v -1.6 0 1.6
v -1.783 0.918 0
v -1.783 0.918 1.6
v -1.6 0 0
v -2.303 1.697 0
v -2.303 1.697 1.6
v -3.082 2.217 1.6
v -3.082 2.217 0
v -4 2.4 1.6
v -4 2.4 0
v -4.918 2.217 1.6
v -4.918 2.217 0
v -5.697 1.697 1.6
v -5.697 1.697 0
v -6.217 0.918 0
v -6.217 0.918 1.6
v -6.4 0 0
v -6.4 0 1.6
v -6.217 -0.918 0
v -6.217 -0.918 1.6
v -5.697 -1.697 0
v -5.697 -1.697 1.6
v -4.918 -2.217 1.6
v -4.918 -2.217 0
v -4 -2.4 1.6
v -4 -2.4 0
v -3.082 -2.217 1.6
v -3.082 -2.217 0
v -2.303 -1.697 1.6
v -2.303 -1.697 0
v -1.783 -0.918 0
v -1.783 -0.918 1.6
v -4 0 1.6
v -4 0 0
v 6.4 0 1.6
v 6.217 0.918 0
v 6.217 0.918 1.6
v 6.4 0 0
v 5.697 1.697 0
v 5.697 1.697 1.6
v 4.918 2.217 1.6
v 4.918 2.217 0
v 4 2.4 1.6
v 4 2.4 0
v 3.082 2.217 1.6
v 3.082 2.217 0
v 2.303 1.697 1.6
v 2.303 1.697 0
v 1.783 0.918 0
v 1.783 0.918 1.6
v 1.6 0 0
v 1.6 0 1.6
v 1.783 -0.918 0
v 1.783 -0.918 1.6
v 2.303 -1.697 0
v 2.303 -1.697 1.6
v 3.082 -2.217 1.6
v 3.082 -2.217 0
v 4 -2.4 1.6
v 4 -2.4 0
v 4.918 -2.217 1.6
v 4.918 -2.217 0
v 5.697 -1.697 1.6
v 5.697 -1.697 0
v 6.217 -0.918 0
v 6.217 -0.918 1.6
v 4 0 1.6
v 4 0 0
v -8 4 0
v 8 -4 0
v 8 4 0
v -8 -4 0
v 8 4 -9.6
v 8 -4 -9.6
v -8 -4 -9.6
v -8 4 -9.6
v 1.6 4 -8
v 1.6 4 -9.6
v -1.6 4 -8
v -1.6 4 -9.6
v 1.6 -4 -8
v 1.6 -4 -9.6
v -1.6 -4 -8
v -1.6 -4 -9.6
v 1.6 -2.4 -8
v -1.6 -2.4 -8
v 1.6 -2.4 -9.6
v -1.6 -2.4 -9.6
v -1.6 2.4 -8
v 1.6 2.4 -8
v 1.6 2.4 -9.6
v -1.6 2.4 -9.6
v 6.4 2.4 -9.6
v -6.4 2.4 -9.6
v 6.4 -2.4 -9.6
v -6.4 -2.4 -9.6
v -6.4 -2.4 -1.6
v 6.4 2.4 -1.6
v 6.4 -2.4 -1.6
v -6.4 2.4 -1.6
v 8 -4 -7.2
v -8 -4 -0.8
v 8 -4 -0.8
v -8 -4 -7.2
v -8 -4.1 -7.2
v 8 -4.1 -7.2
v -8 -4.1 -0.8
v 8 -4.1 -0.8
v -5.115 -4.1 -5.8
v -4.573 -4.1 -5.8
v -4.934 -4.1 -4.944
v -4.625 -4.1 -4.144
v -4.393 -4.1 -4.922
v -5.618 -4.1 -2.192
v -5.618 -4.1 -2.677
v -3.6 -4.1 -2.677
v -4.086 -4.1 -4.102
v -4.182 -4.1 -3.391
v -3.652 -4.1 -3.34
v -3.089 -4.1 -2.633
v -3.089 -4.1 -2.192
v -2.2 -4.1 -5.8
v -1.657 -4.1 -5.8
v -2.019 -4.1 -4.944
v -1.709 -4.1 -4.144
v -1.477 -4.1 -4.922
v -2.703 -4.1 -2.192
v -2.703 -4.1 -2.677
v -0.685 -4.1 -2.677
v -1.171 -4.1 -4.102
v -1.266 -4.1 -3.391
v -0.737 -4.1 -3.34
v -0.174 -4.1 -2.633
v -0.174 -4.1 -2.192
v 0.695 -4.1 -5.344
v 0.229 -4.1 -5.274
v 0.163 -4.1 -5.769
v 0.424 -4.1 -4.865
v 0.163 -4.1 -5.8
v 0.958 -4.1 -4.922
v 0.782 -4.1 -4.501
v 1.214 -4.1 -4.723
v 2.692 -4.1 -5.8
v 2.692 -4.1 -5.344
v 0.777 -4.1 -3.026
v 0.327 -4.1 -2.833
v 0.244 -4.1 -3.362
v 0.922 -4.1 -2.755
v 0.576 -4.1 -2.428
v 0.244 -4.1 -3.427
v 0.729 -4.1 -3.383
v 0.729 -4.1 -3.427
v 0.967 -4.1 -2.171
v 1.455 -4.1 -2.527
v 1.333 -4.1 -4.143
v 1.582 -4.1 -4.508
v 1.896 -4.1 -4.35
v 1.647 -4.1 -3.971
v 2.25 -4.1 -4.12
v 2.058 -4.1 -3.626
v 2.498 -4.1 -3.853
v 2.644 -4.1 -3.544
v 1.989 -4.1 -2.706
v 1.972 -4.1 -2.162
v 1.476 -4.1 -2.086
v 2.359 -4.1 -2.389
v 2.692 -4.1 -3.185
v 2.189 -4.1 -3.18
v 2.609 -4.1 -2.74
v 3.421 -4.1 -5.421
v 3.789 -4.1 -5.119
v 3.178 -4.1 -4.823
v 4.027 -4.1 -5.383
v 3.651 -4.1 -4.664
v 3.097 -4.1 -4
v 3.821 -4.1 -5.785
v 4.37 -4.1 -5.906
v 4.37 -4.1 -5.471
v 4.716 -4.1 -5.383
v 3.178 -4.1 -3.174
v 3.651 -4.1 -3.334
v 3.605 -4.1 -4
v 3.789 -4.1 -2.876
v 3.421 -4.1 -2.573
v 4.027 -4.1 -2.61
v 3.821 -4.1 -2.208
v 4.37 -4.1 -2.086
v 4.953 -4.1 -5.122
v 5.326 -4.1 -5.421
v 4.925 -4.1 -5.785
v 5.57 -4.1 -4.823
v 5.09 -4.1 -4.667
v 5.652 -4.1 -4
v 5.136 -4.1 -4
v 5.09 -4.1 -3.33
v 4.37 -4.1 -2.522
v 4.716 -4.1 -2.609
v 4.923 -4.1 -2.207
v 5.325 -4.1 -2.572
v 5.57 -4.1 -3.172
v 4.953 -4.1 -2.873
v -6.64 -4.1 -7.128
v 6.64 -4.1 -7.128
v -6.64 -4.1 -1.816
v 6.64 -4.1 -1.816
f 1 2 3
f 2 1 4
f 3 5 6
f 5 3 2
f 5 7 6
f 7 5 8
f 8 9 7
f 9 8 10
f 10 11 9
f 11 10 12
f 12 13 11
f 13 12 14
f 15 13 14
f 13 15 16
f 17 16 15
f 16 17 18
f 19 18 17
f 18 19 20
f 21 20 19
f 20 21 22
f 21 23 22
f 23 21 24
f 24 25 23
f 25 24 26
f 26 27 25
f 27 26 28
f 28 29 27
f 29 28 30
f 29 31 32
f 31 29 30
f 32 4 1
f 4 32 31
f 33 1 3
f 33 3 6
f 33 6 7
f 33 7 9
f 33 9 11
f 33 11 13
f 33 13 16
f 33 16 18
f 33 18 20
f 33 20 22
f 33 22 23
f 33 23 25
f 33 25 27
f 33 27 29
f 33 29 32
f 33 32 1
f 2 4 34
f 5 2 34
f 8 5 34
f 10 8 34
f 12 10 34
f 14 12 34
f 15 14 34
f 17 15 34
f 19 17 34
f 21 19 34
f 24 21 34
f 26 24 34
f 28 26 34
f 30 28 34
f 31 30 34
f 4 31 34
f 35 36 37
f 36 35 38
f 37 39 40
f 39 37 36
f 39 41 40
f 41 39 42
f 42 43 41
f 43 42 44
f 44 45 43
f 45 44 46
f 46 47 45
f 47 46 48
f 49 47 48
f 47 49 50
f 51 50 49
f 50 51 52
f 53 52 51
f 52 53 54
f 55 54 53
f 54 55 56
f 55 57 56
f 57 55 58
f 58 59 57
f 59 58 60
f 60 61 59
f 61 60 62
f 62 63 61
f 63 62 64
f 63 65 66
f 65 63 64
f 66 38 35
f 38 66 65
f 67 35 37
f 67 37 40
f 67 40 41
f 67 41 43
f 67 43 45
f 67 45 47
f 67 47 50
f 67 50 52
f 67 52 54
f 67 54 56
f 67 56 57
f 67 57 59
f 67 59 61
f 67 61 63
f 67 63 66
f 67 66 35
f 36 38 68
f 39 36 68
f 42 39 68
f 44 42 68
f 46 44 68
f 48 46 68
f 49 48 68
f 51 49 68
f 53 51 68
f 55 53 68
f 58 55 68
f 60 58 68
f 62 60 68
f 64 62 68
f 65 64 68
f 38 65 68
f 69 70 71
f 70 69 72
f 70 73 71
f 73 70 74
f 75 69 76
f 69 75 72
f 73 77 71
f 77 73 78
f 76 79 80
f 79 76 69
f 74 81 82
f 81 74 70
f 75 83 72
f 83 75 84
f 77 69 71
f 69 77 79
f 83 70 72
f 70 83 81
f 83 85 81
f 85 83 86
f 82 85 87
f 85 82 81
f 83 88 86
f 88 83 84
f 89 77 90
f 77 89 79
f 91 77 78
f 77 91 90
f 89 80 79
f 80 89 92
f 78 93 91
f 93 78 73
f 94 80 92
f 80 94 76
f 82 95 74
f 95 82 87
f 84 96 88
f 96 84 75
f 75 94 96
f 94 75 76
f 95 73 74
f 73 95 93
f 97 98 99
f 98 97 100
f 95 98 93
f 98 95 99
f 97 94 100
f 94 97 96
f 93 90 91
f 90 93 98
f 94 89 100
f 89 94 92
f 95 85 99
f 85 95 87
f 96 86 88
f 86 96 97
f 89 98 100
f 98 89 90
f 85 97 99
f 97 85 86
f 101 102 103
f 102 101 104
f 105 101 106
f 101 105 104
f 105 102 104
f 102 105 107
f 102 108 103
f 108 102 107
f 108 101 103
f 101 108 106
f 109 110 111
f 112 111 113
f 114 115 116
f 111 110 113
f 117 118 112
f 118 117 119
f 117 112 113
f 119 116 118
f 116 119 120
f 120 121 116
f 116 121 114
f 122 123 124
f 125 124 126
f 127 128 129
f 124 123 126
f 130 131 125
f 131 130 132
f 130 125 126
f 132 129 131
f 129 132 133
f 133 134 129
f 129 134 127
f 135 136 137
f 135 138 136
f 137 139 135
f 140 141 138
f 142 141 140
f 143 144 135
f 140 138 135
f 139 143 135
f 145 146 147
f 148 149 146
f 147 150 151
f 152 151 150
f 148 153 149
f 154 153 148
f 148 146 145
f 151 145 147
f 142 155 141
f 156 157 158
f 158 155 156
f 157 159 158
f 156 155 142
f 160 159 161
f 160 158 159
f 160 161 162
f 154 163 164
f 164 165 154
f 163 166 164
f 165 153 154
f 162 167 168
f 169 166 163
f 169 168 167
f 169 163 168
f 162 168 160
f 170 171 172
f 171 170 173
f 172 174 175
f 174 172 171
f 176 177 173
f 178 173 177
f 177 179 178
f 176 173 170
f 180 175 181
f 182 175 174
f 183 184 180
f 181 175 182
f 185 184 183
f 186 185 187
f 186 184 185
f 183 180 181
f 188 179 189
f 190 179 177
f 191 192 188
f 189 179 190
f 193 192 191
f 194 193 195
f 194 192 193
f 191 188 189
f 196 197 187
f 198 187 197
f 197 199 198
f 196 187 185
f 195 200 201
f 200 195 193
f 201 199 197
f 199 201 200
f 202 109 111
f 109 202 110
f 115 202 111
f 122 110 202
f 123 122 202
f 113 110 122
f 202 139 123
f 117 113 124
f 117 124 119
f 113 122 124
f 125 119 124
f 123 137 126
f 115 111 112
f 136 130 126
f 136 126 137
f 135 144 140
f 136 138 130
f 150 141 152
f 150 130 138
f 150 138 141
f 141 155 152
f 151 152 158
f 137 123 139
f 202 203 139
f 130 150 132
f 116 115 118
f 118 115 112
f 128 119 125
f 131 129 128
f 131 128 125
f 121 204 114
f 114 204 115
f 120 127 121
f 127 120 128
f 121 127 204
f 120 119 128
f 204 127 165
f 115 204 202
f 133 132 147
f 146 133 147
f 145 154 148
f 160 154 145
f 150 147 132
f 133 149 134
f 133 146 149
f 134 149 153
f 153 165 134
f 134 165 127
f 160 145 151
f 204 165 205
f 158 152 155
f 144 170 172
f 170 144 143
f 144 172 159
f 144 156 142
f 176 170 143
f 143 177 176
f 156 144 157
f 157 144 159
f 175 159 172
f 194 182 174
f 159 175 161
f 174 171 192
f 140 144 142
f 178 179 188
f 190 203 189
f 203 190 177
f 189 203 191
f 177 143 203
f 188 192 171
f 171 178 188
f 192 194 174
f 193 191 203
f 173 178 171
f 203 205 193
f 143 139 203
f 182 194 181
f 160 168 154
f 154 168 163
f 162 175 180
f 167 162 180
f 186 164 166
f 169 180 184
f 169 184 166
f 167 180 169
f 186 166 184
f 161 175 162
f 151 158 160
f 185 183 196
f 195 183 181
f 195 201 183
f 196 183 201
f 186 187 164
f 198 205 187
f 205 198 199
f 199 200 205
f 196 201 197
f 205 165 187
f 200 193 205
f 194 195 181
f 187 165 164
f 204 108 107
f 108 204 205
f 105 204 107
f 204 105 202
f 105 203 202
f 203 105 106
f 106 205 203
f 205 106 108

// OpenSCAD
// file: ../p/4-4edge.scad
use <../lib.scad>
function ldraw_lib__4_4edge() = [
// 0 Circle 1.0
// 0 Name: 4-4edge.dat
// 0 Author: James Jessiman
// 0 !LDRAW_ORG Primitive UPDATE 2017-01
// 0 !LICENSE Licensed under CC BY 2.0 and CC BY 4.0 : see CAreadme.txt
// 
// 0 BFC CERTIFY CCW
  [0,"BFC","CERTIFY"],
  [0,"BFC","CCW"],
// 
// 0 !HISTORY 1998-12-15 [PTadmin] Official Update 1998-10
// 0 !HISTORY 2005-12-28 [PTadmin] Official Update 2005-01
// 0 !HISTORY 2007-06-24 [PTadmin] Header formatted for Contributor Agreement
// 0 !HISTORY 2008-07-01 [PTadmin] Official Update 2008-01
// 0 !HISTORY 2017-01-15 [Steffen] BFCed
// 0 !HISTORY 2017-12-30 [PTadmin] Official Update 2017-01
// 
// 
// 2 24 1 0 0 0.9239 0 0.3827
  [2,24,1,0,0,0.9239,0,0.3827],
// 2 24 0.9239 0 0.3827 0.7071 0 0.7071
  [2,24,0.9239,0,0.3827,0.7071,0,0.7071],
// 2 24 0.7071 0 0.7071 0.3827 0 0.9239
  [2,24,0.7071,0,0.7071,0.3827,0,0.9239],
// 2 24 0.3827 0 0.9239 0 0 1
  [2,24,0.3827,0,0.9239,0,0,1],
// 2 24 0 0 1 -0.3827 0 0.9239
  [2,24,0,0,1,-0.3827,0,0.9239],
// 2 24 -0.3827 0 0.9239 -0.7071 0 0.7071
  [2,24,-0.3827,0,0.9239,-0.7071,0,0.7071],
// 2 24 -0.7071 0 0.7071 -0.9239 0 0.3827
  [2,24,-0.7071,0,0.7071,-0.9239,0,0.3827],
// 2 24 -0.9239 0 0.3827 -1 0 -0
  [2,24,-0.9239,0,0.3827,-1,0,-0],
// 2 24 -1 0 -0 -0.9239 0 -0.3827
  [2,24,-1,0,-0,-0.9239,0,-0.3827],
// 2 24 -0.9239 0 -0.3827 -0.7071 0 -0.7071
  [2,24,-0.9239,0,-0.3827,-0.7071,0,-0.7071],
// 2 24 -0.7071 0 -0.7071 -0.3827 0 -0.9239
  [2,24,-0.7071,0,-0.7071,-0.3827,0,-0.9239],
// 2 24 -0.3827 0 -0.9239 0 0 -1
  [2,24,-0.3827,0,-0.9239,0,0,-1],
// 2 24 0 0 -1 0.3827 0 -0.9239
  [2,24,0,0,-1,0.3827,0,-0.9239],
// 2 24 0.3827 0 -0.9239 0.7071 0 -0.7071
  [2,24,0.3827,0,-0.9239,0.7071,0,-0.7071],
// 2 24 0.7071 0 -0.7071 0.9239 0 -0.3827
  [2,24,0.7071,0,-0.7071,0.9239,0,-0.3827],
// 2 24 0.9239 0 -0.3827 1 0 0
  [2,24,0.9239,0,-0.3827,1,0,0],
];
module ldraw_lib__4_4edge(step=0, col=false, unit=2/5, alt=false, line=0.2, solid=!$preview)
    makepoly(ldraw_lib__4_4edge(), step=step, col=col, unit=unit, alt=alt, line=line, solid=solid);
ldraw_lib__4_4edge(line=0.2);
// file: ../p/4-4disc.scad
use <../lib.scad>
function ldraw_lib__4_4disc() = [
// 0 Disc 1.0
// 0 Name: 4-4disc.dat
// 0 Author: James Jessiman
// 0 !LDRAW_ORG Primitive UPDATE 2002-02
// 0 !LICENSE Licensed under CC BY 2.0 and CC BY 4.0 : see CAreadme.txt
// 
// 0 BFC CERTIFY CCW
  [0,"BFC","CERTIFY"],
  [0,"BFC","CCW"],
// 
// 0 !HISTORY 1998-12-15 [PTadmin] Official Update 1998-10
// 0 !HISTORY 2002-03-23 [sbliss] Added BFC statement
// 0 !HISTORY 2002-04-25 [PTadmin] Official Update 2002-02
// 0 !HISTORY 2007-06-24 [PTadmin] Header formatted for Contributor Agreement
// 0 !HISTORY 2008-07-01 [PTadmin] Official Update 2008-01
// 
// 
// 3 16 0 0 0 1 0 0 0.9239 0 0.3827
  [3,16,0,0,0,1,0,0,0.9239,0,0.3827],
// 3 16 0 0 0 0.9239 0 0.3827 0.7071 0 0.7071
  [3,16,0,0,0,0.9239,0,0.3827,0.7071,0,0.7071],
// 3 16 0 0 0 0.7071 0 0.7071 0.3827 0 0.9239
  [3,16,0,0,0,0.7071,0,0.7071,0.3827,0,0.9239],
// 3 16 0 0 0 0.3827 0 0.9239 0 0 1
  [3,16,0,0,0,0.3827,0,0.9239,0,0,1],
// 3 16 0 0 0 0 0 1 -0.3827 0 0.9239
  [3,16,0,0,0,0,0,1,-0.3827,0,0.9239],
// 3 16 0 0 0 -0.3827 0 0.9239 -0.7071 0 0.7071
  [3,16,0,0,0,-0.3827,0,0.9239,-0.7071,0,0.7071],
// 3 16 0 0 0 -0.7071 0 0.7071 -0.9239 0 0.3827
  [3,16,0,0,0,-0.7071,0,0.7071,-0.9239,0,0.3827],
// 3 16 0 0 0 -0.9239 0 0.3827 -1 0 -0
  [3,16,0,0,0,-0.9239,0,0.3827,-1,0,-0],
// 3 16 0 0 0 -1 0 -0 -0.9239 0 -0.3827
  [3,16,0,0,0,-1,0,-0,-0.9239,0,-0.3827],
// 3 16 0 0 0 -0.9239 0 -0.3827 -0.7071 0 -0.7071
  [3,16,0,0,0,-0.9239,0,-0.3827,-0.7071,0,-0.7071],
// 3 16 0 0 0 -0.7071 0 -0.7071 -0.3827 0 -0.9239
  [3,16,0,0,0,-0.7071,0,-0.7071,-0.3827,0,-0.9239],
// 3 16 0 0 0 -0.3827 0 -0.9239 0 0 -1
  [3,16,0,0,0,-0.3827,0,-0.9239,0,0,-1],
// 3 16 0 0 0 0 0 -1 0.3827 0 -0.9239
  [3,16,0,0,0,0,0,-1,0.3827,0,-0.9239],
// 3 16 0 0 0 0.3827 0 -0.9239 0.7071 0 -0.7071
  [3,16,0,0,0,0.3827,0,-0.9239,0.7071,0,-0.7071],
// 3 16 0 0 0 0.7071 0 -0.7071 0.9239 0 -0.3827
  [3,16,0,0,0,0.7071,0,-0.7071,0.9239,0,-0.3827],
// 3 16 0 0 0 0.9239 0 -0.3827 1 0 0
  [3,16,0,0,0,0.9239,0,-0.3827,1,0,0],
// 0
];
module ldraw_lib__4_4disc(step=0, col=false, unit=2/5, alt=false, line=0.2, solid=!$preview)
    makepoly(ldraw_lib__4_4disc(), step=step, col=col, unit=unit, alt=alt, line=line, solid=solid);
ldraw_lib__4_4disc(line=0.2);
// file: ../p/4-4cyli.scad
use <../lib.scad>
$fa=1; $fs=0.2;
function ldraw_lib__4_4cyli(realsolid=false) = [
// 0 Cylinder 1.0
// 0 Name: 4-4cyli.dat
// 0 Author: James Jessiman
// 0 !LDRAW_ORG Primitive UPDATE 2005-01
// 0 !LICENSE Licensed under CC BY 2.0 and CC BY 4.0 : see CAreadme.txt
// 
// 0 BFC CERTIFY CCW
  [0,"BFC","CERTIFY"],
  [0,"BFC","CCW"],
// 
// 0 !HISTORY 1998-12-15 [PTadmin] Official Update 1998-10
// 0 !HISTORY 2002-03-23 [sbliss] Added BFC statement; merged headers from files in distributions LDraw 0.27 and Complete.
// 0 !HISTORY 2002-04-25 [PTadmin] Official Update 2002-02
// 0 !HISTORY 2004-12-14 [guyvivan] BFC CCW
// 0 !HISTORY 2005-12-28 [PTadmin] Official Update 2005-01
// 0 !HISTORY 2007-06-24 [PTadmin] Header formatted for Contributor Agreement
// 0 !HISTORY 2008-07-01 [PTadmin] Official Update 2008-01
// 
// 
// 4 16 1 1 0 0.9239 1 0.3827 0.9239 0 0.3827 1 0 0
  [4,16,1,1,0,0.9239,1,0.3827,0.9239,0,0.3827,1,0,0],
// 5 24 1 0 0 1 1 0 0.9239 0 0.3827 0.9239 0 -0.3827
  [5,24,1,0,0,1,1,0,0.9239,0,0.3827,0.9239,0,-0.3827],
// 4 16 0.9239 1 0.3827 0.7071 1 0.7071 0.7071 0 0.7071 0.9239 0 0.3827
  [4,16,0.9239,1,0.3827,0.7071,1,0.7071,0.7071,0,0.7071,0.9239,0,0.3827],
// 5 24 0.9239 0 0.3827 0.9239 1 0.3827 0.7071 0 0.7071 1 0 0
  [5,24,0.9239,0,0.3827,0.9239,1,0.3827,0.7071,0,0.7071,1,0,0],
// 4 16 0.7071 1 0.7071 0.3827 1 0.9239 0.3827 0 0.9239 0.7071 0 0.7071
  [4,16,0.7071,1,0.7071,0.3827,1,0.9239,0.3827,0,0.9239,0.7071,0,0.7071],
// 5 24 0.7071 0 0.7071 0.7071 1 0.7071 0.3827 0 0.9239 0.9239 0 0.3827
  [5,24,0.7071,0,0.7071,0.7071,1,0.7071,0.3827,0,0.9239,0.9239,0,0.3827],
// 4 16 0.3827 1 0.9239 0 1 1 0 0 1 0.3827 0 0.9239
  [4,16,0.3827,1,0.9239,0,1,1,0,0,1,0.3827,0,0.9239],
// 5 24 0.3827 0 0.9239 0.3827 1 0.9239 0 0 1 0.7071 0 0.7071
  [5,24,0.3827,0,0.9239,0.3827,1,0.9239,0,0,1,0.7071,0,0.7071],
// 4 16 0 1 1 -0.3827 1 0.9239 -0.3827 0 0.9239 0 0 1
  [4,16,0,1,1,-0.3827,1,0.9239,-0.3827,0,0.9239,0,0,1],
// 5 24 0 0 1 0 1 1 -0.3827 0 0.9239 0.3827 0 0.9239
  [5,24,0,0,1,0,1,1,-0.3827,0,0.9239,0.3827,0,0.9239],
// 4 16 -0.3827 1 0.9239 -0.7071 1 0.7071 -0.7071 0 0.7071 -0.3827 0 0.9239
  [4,16,-0.3827,1,0.9239,-0.7071,1,0.7071,-0.7071,0,0.7071,-0.3827,0,0.9239],
// 5 24 -0.3827 0 0.9239 -0.3827 1 0.9239 -0.7071 0 0.7071 0 0 1
  [5,24,-0.3827,0,0.9239,-0.3827,1,0.9239,-0.7071,0,0.7071,0,0,1],
// 4 16 -0.7071 1 0.7071 -0.9239 1 0.3827 -0.9239 0 0.3827 -0.7071 0 0.7071
  [4,16,-0.7071,1,0.7071,-0.9239,1,0.3827,-0.9239,0,0.3827,-0.7071,0,0.7071],
// 5 24 -0.7071 0 0.7071 -0.7071 1 0.7071 -0.9239 0 0.3827 -0.3827 0 0.9239
  [5,24,-0.7071,0,0.7071,-0.7071,1,0.7071,-0.9239,0,0.3827,-0.3827,0,0.9239],
// 4 16 -0.9239 1 0.3827 -1 1 0 -1 0 0 -0.9239 0 0.3827
  [4,16,-0.9239,1,0.3827,-1,1,0,-1,0,0,-0.9239,0,0.3827],
// 5 24 -0.9239 0 0.3827 -0.9239 1 0.3827 -1 0 0 -0.7071 0 0.7071
  [5,24,-0.9239,0,0.3827,-0.9239,1,0.3827,-1,0,0,-0.7071,0,0.7071],
// 4 16 -1 1 0 -0.9239 1 -0.3827 -0.9239 0 -0.3827 -1 0 0
  [4,16,-1,1,0,-0.9239,1,-0.3827,-0.9239,0,-0.3827,-1,0,0],
// 5 24 -1 0 0 -1 1 0 -0.9239 0 -0.3827 -0.9239 0 0.3827
  [5,24,-1,0,0,-1,1,0,-0.9239,0,-0.3827,-0.9239,0,0.3827],
// 4 16 -0.9239 1 -0.3827 -0.7071 1 -0.7071 -0.7071 0 -0.7071 -0.9239 0 -0.3827
  [4,16,-0.9239,1,-0.3827,-0.7071,1,-0.7071,-0.7071,0,-0.7071,-0.9239,0,-0.3827],
// 5 24 -0.9239 0 -0.3827 -0.9239 1 -0.3827 -0.7071 0 -0.7071 -1 0 0
  [5,24,-0.9239,0,-0.3827,-0.9239,1,-0.3827,-0.7071,0,-0.7071,-1,0,0],
// 4 16 -0.7071 1 -0.7071 -0.3827 1 -0.9239 -0.3827 0 -0.9239 -0.7071 0 -0.7071
  [4,16,-0.7071,1,-0.7071,-0.3827,1,-0.9239,-0.3827,0,-0.9239,-0.7071,0,-0.7071],
// 5 24 -0.7071 0 -0.7071 -0.7071 1 -0.7071 -0.3827 0 -0.9239 -0.9239 0 -0.3827
  [5,24,-0.7071,0,-0.7071,-0.7071,1,-0.7071,-0.3827,0,-0.9239,-0.9239,0,-0.3827],
// 4 16 -0.3827 1 -0.9239 0 1 -1 0 0 -1 -0.3827 0 -0.9239
  [4,16,-0.3827,1,-0.9239,0,1,-1,0,0,-1,-0.3827,0,-0.9239],
// 5 24 -0.3827 0 -0.9239 -0.3827 1 -0.9239 0 0 -1 -0.7071 0 -0.7071
  [5,24,-0.3827,0,-0.9239,-0.3827,1,-0.9239,0,0,-1,-0.7071,0,-0.7071],
// 4 16 0 1 -1 0.3827 1 -0.9239 0.3827 0 -0.9239 0 0 -1
  [4,16,0,1,-1,0.3827,1,-0.9239,0.3827,0,-0.9239,0,0,-1],
// 5 24 0 0 -1 0 1 -1 0.3827 0 -0.9239 -0.3827 0 -0.9239
  [5,24,0,0,-1,0,1,-1,0.3827,0,-0.9239,-0.3827,0,-0.9239],
// 4 16 0.3827 1 -0.9239 0.7071 1 -0.7071 0.7071 0 -0.7071 0.3827 0 -0.9239
  [4,16,0.3827,1,-0.9239,0.7071,1,-0.7071,0.7071,0,-0.7071,0.3827,0,-0.9239],
// 5 24 0.3827 0 -0.9239 0.3827 1 -0.9239 0.7071 0 -0.7071 0 0 -1
  [5,24,0.3827,0,-0.9239,0.3827,1,-0.9239,0.7071,0,-0.7071,0,0,-1],
// 4 16 0.7071 1 -0.7071 0.9239 1 -0.3827 0.9239 0 -0.3827 0.7071 0 -0.7071
  [4,16,0.7071,1,-0.7071,0.9239,1,-0.3827,0.9239,0,-0.3827,0.7071,0,-0.7071],
// 5 24 0.7071 0 -0.7071 0.7071 1 -0.7071 0.9239 0 -0.3827 0.3827 0 -0.9239
  [5,24,0.7071,0,-0.7071,0.7071,1,-0.7071,0.9239,0,-0.3827,0.3827,0,-0.9239],
// 4 16 0.9239 1 -0.3827 1 1 0 1 0 0 0.9239 0 -0.3827
  [4,16,0.9239,1,-0.3827,1,1,0,1,0,0,0.9239,0,-0.3827],
// 5 24 0.9239 0 -0.3827 0.9239 1 -0.3827 1 0 0 0.7071 0 -0.7071
  [5,24,0.9239,0,-0.3827,0.9239,1,-0.3827,1,0,0,0.7071,0,-0.7071],
// 0
];
module ldraw_lib__4_4cyli(step=0, col=false, unit=2/5, alt=false, line=0.2, solid=!$preview)
    makepoly(ldraw_lib__4_4cyli(solid), step=step, col=col, unit=unit, alt=alt, line=line, solid=solid);
ldraw_lib__4_4cyli(line=0.2);
// file: ../p/stud.scad
use <../lib.scad>
use <4-4cyli.scad>
use <4-4disc.scad>
use <4-4edge.scad>
function ldraw_lib__stud() = [
// 0 Stud
// 0 Name: stud.dat
// 0 Author: James Jessiman
// 0 !LDRAW_ORG Primitive UPDATE 2012-01
// 0 !LICENSE Licensed under CC BY 4.0 : see CAreadme.txt
// 
// 0 BFC CERTIFY CCW
  [0,"BFC","CERTIFY"],
  [0,"BFC","CCW"],
// 
// 0 !HISTORY 2002-04-04 [sbliss] Modified for BFC compliance
// 0 !HISTORY 2002-04-25 [PTadmin] Official Update 2002-02
// 0 !HISTORY 2007-06-24 [PTadmin] Header formatted for Contributor Agreement
// 0 !HISTORY 2008-07-01 [PTadmin] Official Update 2008-01
// 0 !HISTORY 2012-02-16 [Philo] Changed to CCW
// 0 !HISTORY 2012-03-30 [PTadmin] Official Update 2012-01
// 
// 
// 1 16 0 0 0 6 0 0 0 1 0 0 0 6 4-4edge.dat
  [1,16,0,0,0,6,0,0,0,1,0,0,0,6, ldraw_lib__4_4edge()],
// 1 16 0 -4 0 6 0 0 0 1 0 0 0 6 4-4edge.dat
  [1,16,0,-4,0,6,0,0,0,1,0,0,0,6, ldraw_lib__4_4edge()],
// 1 16 0 0 0 6 0 0 0 -4 0 0 0 6 4-4cyli.dat
  [1,16,0,0,0,6,0,0,0,-4,0,0,0,6, ldraw_lib__4_4cyli()],
// 1 16 0 -4 0 6 0 0 0 1 0 0 0 6 4-4disc.dat
  [1,16,0,-4,0,6,0,0,0,1,0,0,0,6, ldraw_lib__4_4disc()],
  [-1,16,0,0,0,6,0,0,0,-1,0,0,0,6, ldraw_lib__4_4disc()],
];
module ldraw_lib__stud(step=0, col=false, unit=2/5, alt=false, line=0.2, solid=!$preview)
    makepoly(ldraw_lib__stud(), step=step, col=col, unit=unit, alt=alt, line=line, solid=solid);
ldraw_lib__stud(line=0.2);
// file: ../p/stug-1x2.scad
use <../lib.scad>
use <stud.scad>
$fa=1; $fs=0.2;
function ldraw_lib__stug_1x2(realsolid=false) = [
// 0 Stud Group  1 x  2
// 0 Name: stug-1x2.dat
// 0 Author: Steffen [Steffen]
// 0 !LDRAW_ORG Primitive UPDATE 2011-01
// 0 !LICENSE Licensed under CC BY 2.0 and CC BY 4.0 : see CAreadme.txt
// 
// 0 BFC CERTIFY CCW
  [0,"BFC","CERTIFY"],
  [0,"BFC","CCW"],
// 
// 0 !HISTORY 2011-07-25 [PTadmin] Official Update 2011-01
// 
// 
// 1 16 -10 0 0 1 0 0 0 1 0 0 0 1 stud.dat
  [1,16,-10,0,0,1,0,0,0,1,0,0,0,1, ldraw_lib__stud(realsolid)],
// 1 16 10 0 0 1 0 0 0 1 0 0 0 1 stud.dat
  [1,16,10,0,0,1,0,0,0,1,0,0,0,1, ldraw_lib__stud(realsolid)],
];
module ldraw_lib__stug_1x2(step=0, col=false, unit=2/5, alt=false, line=0.2, solid=!$preview)
    makepoly(ldraw_lib__stug_1x2(solid), step=step, col=col, unit=unit, alt=alt, line=line, solid=solid);
ldraw_lib__stug_1x2(line=0.2);
// file: ../p/box3u2p.scad
use <../lib.scad>
function ldraw_lib__box3u2p() = [
// 0 Box with 3 Faces without 2 Parallel Edges
// 0 Name: box3u2p.dat
// 0 Author: Niels Karsdorp [nielsk]
// 0 !LDRAW_ORG Primitive UPDATE 2012-01
// 0 !LICENSE Licensed under CC BY 2.0 and CC BY 4.0 : see CAreadme.txt
// 
// 0 BFC CERTIFY CCW
  [0,"BFC","CERTIFY"],
  [0,"BFC","CCW"],
// 
// 0 !HISTORY 2003-03-12 [PTadmin] Official Update 2003-01
// 0 !HISTORY 2007-06-24 [PTadmin] Header formatted for Contributor Agreement
// 0 !HISTORY 2008-07-01 [PTadmin] Official Update 2008-01
// 0 !HISTORY 2012-02-16 [Philo] Changed to CCW
// 0 !HISTORY 2012-03-30 [PTadmin] Official Update 2012-01
// 
// 
// 2 24 1 1 1 -1 1 1
  [2,24,1,1,1,-1,1,1],
// 2 24 -1 1 -1 1 1 -1
  [2,24,-1,1,-1,1,1,-1],
// 2 24 1 0 1 -1 0 1
  [2,24,1,0,1,-1,0,1],
// 2 24 -1 0 -1 1 0 -1
  [2,24,-1,0,-1,1,0,-1],
// 2 24 1 1 1 1 1 -1
  [2,24,1,1,1,1,1,-1],
// 2 24 -1 1 1 -1 1 -1
  [2,24,-1,1,1,-1,1,-1],
// 2 24 1 1 1 1 0 1
  [2,24,1,1,1,1,0,1],
// 2 24 1 1 -1 1 0 -1
  [2,24,1,1,-1,1,0,-1],
// 2 24 -1 1 1 -1 0 1
  [2,24,-1,1,1,-1,0,1],
// 2 24 -1 1 -1 -1 0 -1
  [2,24,-1,1,-1,-1,0,-1],
// 4 16 -1 1 -1 -1 1 1 1 1 1 1 1 -1
  [4,16,-1,1,-1,-1,1,1,1,1,1,1,1,-1],
// 4 16 -1 1 1 -1 0 1 1 0 1 1 1 1
  [4,16,-1,1,1,-1,0,1,1,0,1,1,1,1],
// 4 16 1 1 -1 1 0 -1 -1 0 -1 -1 1 -1
  [4,16,1,1,-1,1,0,-1,-1,0,-1,-1,1,-1],
];
module ldraw_lib__box3u2p(step=0, col=false, unit=2/5, alt=false, line=0.2, solid=!$preview)
    makepoly(ldraw_lib__box3u2p(), step=step, col=col, unit=unit, alt=alt, line=line, solid=solid);
ldraw_lib__box3u2p(line=0.2);
// file: ../p/box5-12.scad
use <../lib.scad>
function ldraw_lib__box5_12() = [
// 0 Box with 5 Faces without Any Edges
// 0 Name: box5-12.dat
// 0 Author: Chris Dee [cwdee]
// 0 !LDRAW_ORG Primitive UPDATE 2009-02
// 0 !LICENSE Licensed under CC BY 2.0 and CC BY 4.0 : see CAreadme.txt
// 
// 0 BFC CERTIFY CCW
  [0,"BFC","CERTIFY"],
  [0,"BFC","CCW"],
// 
// 0 !HISTORY 2009-09-03 [PTadmin] Official Update 2009-02
// 
// 
// 4 16 1 1 1 1 1 -1 -1 1 -1 -1 1 1
  [4,16,1,1,1,1,1,-1,-1,1,-1,-1,1,1],
// 4 16 -1 0 1 1 0 1 1 1 1 -1 1 1
  [4,16,-1,0,1,1,0,1,1,1,1,-1,1,1],
// 4 16 -1 0 -1 -1 0 1 -1 1 1 -1 1 -1
  [4,16,-1,0,-1,-1,0,1,-1,1,1,-1,1,-1],
// 4 16 1 0 -1 -1 0 -1 -1 1 -1 1 1 -1
  [4,16,1,0,-1,-1,0,-1,-1,1,-1,1,1,-1],
// 4 16 1 0 1 1 0 -1 1 1 -1 1 1 1
  [4,16,1,0,1,1,0,-1,1,1,-1,1,1,1],
// 0
];
module ldraw_lib__box5_12(step=0, col=false, unit=2/5, alt=false, line=0.2, solid=!$preview)
    makepoly(ldraw_lib__box5_12(), step=step, col=col, unit=unit, alt=alt, line=line, solid=solid);
ldraw_lib__box5_12(line=0.2);
// file: 3134.scad
use <../lib.scad>
use <../p/box3u2p.scad>
use <../p/stug-1x2.scad>
function ldraw_lib__3134() = [
// 0 Brick  1 x  2 with Cable Cutout
// 0 Name: 3134.dat
// 0 Author: Takeshi Takahashi [RainbowDolphin]
// 0 !LDRAW_ORG Part UPDATE 2024-05
// 0 !LICENSE Licensed under CC BY 4.0 : see CAreadme.txt
// 
// 0 BFC CERTIFY CCW
  [0,"BFC","CERTIFY"],
  [0,"BFC","CCW"],
// 
// 0 !HISTORY 1998-02-12 [PTadmin] Official Update 1998-02
// 0 !HISTORY 2007-06-24 [PTadmin] Header formatted for Contributor Agreement
// 0 !HISTORY 2008-07-01 [PTadmin] Official Update 2008-01
// 0 !HISTORY 2011-07-30 [Steffen] BFCed, better use of primitives, adjusted title
// 0 !HISTORY 2011-12-29 [PTadmin] Official Update 2011-02
// 0 !HISTORY 2024-05-23 [RainbowDolphin] Total rewrite with BFC CCW, original by Lutz Uhlmann [El-Lutzo]
// 0 !HISTORY 2024-06-30 [OrionP] Official Update 2024-05
// 
// 0 // Top stud
// 1 16 0 0 0 1 0 0 0 1 0 0 0 1 stug-1x2.dat
  [1,16,0,0,0,1,0,0,0,1,0,0,0,1, ldraw_lib__stug_1x2()],
// 0 // Outer surface
// 1 16 0 24 0 0 0 20 0 -24 0 10 0 0 box3u2p.dat
  [1,16,0,24,0,0,0,20,0,-24,0,10,0,0, ldraw_lib__box3u2p()],
// 4 16 4 24 10 4 20 10 20 0 10 20 24 10
  [4,16,4,24,10,4,20,10,20,0,10,20,24,10],
// 4 16 -4 20 10 -4 24 10 -20 24 10 -20 0 10
  [4,16,-4,20,10,-4,24,10,-20,24,10,-20,0,10],
// 4 16 4 20 -10 4 24 -10 20 24 -10 20 0 -10
  [4,16,4,20,-10,4,24,-10,20,24,-10,20,0,-10],
// 4 16 -4 24 -10 -4 20 -10 -20 0 -10 -20 24 -10
  [4,16,-4,24,-10,-4,20,-10,-20,0,-10,-20,24,-10],
// 4 16 -4 20 10 -20 0 10 20 0 10 4 20 10
  [4,16,-4,20,10,-20,0,10,20,0,10,4,20,10],
// 4 16 -20 0 -10 -4 20 -10 4 20 -10 20 0 -10
  [4,16,-20,0,-10,-4,20,-10,4,20,-10,20,0,-10],
// 0 // Bottom and cutout
// 0 BFC INVERTNEXT
  [0,"BFC","INVERTNEXT"],
// 1 16 0 24 -8 0 0 4 0 -4 0 2 0 0 box3u2p.dat
  [1,16,0,24,-8,0,0,4,0,-4,0,2,0,0, ldraw_lib__box3u2p()],
// 0 BFC INVERTNEXT
  [0,"BFC","INVERTNEXT"],
// 1 16 0 24 8 0 0 4 0 -4 0 2 0 0 box3u2p.dat
  [1,16,0,24,8,0,0,4,0,-4,0,2,0,0, ldraw_lib__box3u2p()],
// 4 16 16 24 6 4 24 6 4 24 10 20 24 10
  [4,16,16,24,6,4,24,6,4,24,10,20,24,10],
// 4 16 -4 24 6 -16 24 6 -20 24 10 -4 24 10
  [4,16,-4,24,6,-16,24,6,-20,24,10,-4,24,10],
// 4 16 4 24 -6 16 24 -6 20 24 -10 4 24 -10
  [4,16,4,24,-6,16,24,-6,20,24,-10,4,24,-10],
// 4 16 -16 24 -6 -4 24 -6 -4 24 -10 -20 24 -10
  [4,16,-16,24,-6,-4,24,-6,-4,24,-10,-20,24,-10],
// 4 16 -16 24 6 -16 24 -6 -20 24 -10 -20 24 10
  [4,16,-16,24,6,-16,24,-6,-20,24,-10,-20,24,10],
// 4 16 16 24 -6 16 24 6 20 24 10 20 24 -10
  [4,16,16,24,-6,16,24,6,20,24,10,20,24,-10],
// 0 // Inner surface
// 0 BFC INVERTNEXT
  [0,"BFC","INVERTNEXT"],
// 1 16 0 24 0 0 0 16 0 -20 0 6 0 0 box3u2p.dat
  [1,16,0,24,0,0,0,16,0,-20,0,6,0,0, ldraw_lib__box3u2p()],
// 4 16 4 20 6 4 24 6 16 24 6 16 4 6
  [4,16,4,20,6,4,24,6,16,24,6,16,4,6],
// 4 16 -4 24 6 -4 20 6 -16 4 6 -16 24 6
  [4,16,-4,24,6,-4,20,6,-16,4,6,-16,24,6],
// 4 16 4 24 -6 4 20 -6 16 4 -6 16 24 -6
  [4,16,4,24,-6,4,20,-6,16,4,-6,16,24,-6],
// 4 16 -4 20 -6 -4 24 -6 -16 24 -6 -16 4 -6
  [4,16,-4,20,-6,-4,24,-6,-16,24,-6,-16,4,-6],
// 4 16 -16 4 6 -4 20 6 4 20 6 16 4 6
  [4,16,-16,4,6,-4,20,6,4,20,6,16,4,6],
// 4 16 16 4 -6 4 20 -6 -4 20 -6 -16 4 -6
  [4,16,16,4,-6,4,20,-6,-4,20,-6,-16,4,-6],
// 0 // Edge lines
// 2 24 20 24 10 4 24 10
  [2,24,20,24,10,4,24,10],
// 2 24 -20 24 10 -4 24 10
  [2,24,-20,24,10,-4,24,10],
// 2 24 20 24 -10 4 24 -10
  [2,24,20,24,-10,4,24,-10],
// 2 24 -20 24 -10 -4 24 -10
  [2,24,-20,24,-10,-4,24,-10],
// 2 24 16 24 6 4 24 6
  [2,24,16,24,6,4,24,6],
// 2 24 -16 24 6 -4 24 6
  [2,24,-16,24,6,-4,24,6],
// 2 24 16 24 -6 4 24 -6
  [2,24,16,24,-6,4,24,-6],
// 2 24 -16 24 -6 -4 24 -6
  [2,24,-16,24,-6,-4,24,-6],
];
module ldraw_lib__3134(step=0, col=false, unit=2/5, alt=false, line=0.2, solid=!$preview)
    makepoly(ldraw_lib__3134(), step=step, col=col, unit=unit, alt=alt, line=line, solid=solid);
ldraw_lib__3134(line=0.2);
// file: 191895b.scad
use <../lib.scad>
use <../p/box5-12.scad>
use <s/191895s01.scad>
function ldraw_lib__191895b() = [
// 0 Sticker  0.8 x  2 with White "7720"
// 0 Name: 191895b.dat
// 0 Author: Steffen [Steffen]
// 0 !LDRAW_ORG Part UPDATE 2012-01
// 0 !LICENSE Licensed under CC BY 2.0 and CC BY 4.0 : see CAreadme.txt
// 
// 0 BFC CERTIFY CCW
  [0,"BFC","CERTIFY"],
  [0,"BFC","CCW"],
// 
// 0 !HISTORY 2012-03-30 [PTadmin] Official Update 2012-01
// 
// 
// 1 16 0 -0.25 0 20 0 0 0 0.25 0 0 0 -8 box5-12.dat
  [1,16,0,-0.25,0,20,0,0,0,0.25,0,0,0,-8, ldraw_lib__box5_12()],
// 1 16 0 -0.25 -4.5 0.415 0 0 0 1 0 0 0 0.415 s\191895s01.dat
  [1,16,0,-0.25,-4.5,0.415,0,0,0,1,0,0,0,0.415, ldraw_lib__s__191895s01()],
// 4 16 -20 -0.25 8 -16.6 -0.25 5.46 16.6 -0.25 5.46 20 -0.25 8
  [4,16,-20,-0.25,8,-16.6,-0.25,5.46,16.6,-0.25,5.46,20,-0.25,8],
// 4 16 -16.6 -0.25 5.46 -20 -0.25 8 -20 -0.25 -8 -16.6 -0.25 -7.82
  [4,16,-16.6,-0.25,5.46,-20,-0.25,8,-20,-0.25,-8,-16.6,-0.25,-7.82],
// 4 16 -16.6 -0.25 -7.82 -20 -0.25 -8 20 -0.25 -8 16.6 -0.25 -7.82
  [4,16,-16.6,-0.25,-7.82,-20,-0.25,-8,20,-0.25,-8,16.6,-0.25,-7.82],
// 4 16 20 -0.25 8 16.6 -0.25 5.46 16.6 -0.25 -7.82 20 -0.25 -8
  [4,16,20,-0.25,8,16.6,-0.25,5.46,16.6,-0.25,-7.82,20,-0.25,-8],
// 0
];
module ldraw_lib__191895b(step=0, col=false, unit=2/5, alt=false, line=0.2, solid=!$preview)
    makepoly(ldraw_lib__191895b(), step=step, col=col, unit=unit, alt=alt, line=line, solid=solid);
ldraw_lib__191895b(line=0.2);
// main file
use <../lib.scad>
use <191895b.scad>
use <3134.scad>
function ldraw_lib__3134d01() = [
// 0 Brick  1 x  2 with Cable Cutout with White "7720" Sticker
// 0 Name: 3134d01.dat
// 0 Author: Takeshi Takahashi [RainbowDolphin]
// 0 !LDRAW_ORG Shortcut UPDATE 2024-05
// 0 !LICENSE Licensed under CC BY 4.0 : see CAreadme.txt
// 
// 0 BFC CERTIFY CCW
  [0,"BFC","CERTIFY"],
  [0,"BFC","CCW"],
// 
// 0 !CATEGORY Sticker Shortcut
// 0 !KEYWORDS Bricklink 3134pb01, Diesel locomotive, set 7720, Train
// 
// 0 !HISTORY 2024-06-30 [OrionP] Official Update 2024-05
// 
// 1 16 0 0 0 1 0 0 0 1 0 0 0 1 3134.dat
  [1,16,0,0,0,1,0,0,0,1,0,0,0,1, ldraw_lib__3134()],
// 1 16 0 10 -10 1 0 0 0 0 -1 0 1 0 191895b.dat
  [1,16,0,10,-10,1,0,0,0,0,-1,0,1,0, ldraw_lib__191895b()],
];
module ldraw_lib__3134d01(step=0, col=false, unit=2/5, alt=false, line=0.2, solid=!$preview)
    makepoly(ldraw_lib__3134d01(), step=step, col=col, unit=unit, alt=alt, line=line, solid=solid);
ldraw_lib__3134d01(line=0.2);
